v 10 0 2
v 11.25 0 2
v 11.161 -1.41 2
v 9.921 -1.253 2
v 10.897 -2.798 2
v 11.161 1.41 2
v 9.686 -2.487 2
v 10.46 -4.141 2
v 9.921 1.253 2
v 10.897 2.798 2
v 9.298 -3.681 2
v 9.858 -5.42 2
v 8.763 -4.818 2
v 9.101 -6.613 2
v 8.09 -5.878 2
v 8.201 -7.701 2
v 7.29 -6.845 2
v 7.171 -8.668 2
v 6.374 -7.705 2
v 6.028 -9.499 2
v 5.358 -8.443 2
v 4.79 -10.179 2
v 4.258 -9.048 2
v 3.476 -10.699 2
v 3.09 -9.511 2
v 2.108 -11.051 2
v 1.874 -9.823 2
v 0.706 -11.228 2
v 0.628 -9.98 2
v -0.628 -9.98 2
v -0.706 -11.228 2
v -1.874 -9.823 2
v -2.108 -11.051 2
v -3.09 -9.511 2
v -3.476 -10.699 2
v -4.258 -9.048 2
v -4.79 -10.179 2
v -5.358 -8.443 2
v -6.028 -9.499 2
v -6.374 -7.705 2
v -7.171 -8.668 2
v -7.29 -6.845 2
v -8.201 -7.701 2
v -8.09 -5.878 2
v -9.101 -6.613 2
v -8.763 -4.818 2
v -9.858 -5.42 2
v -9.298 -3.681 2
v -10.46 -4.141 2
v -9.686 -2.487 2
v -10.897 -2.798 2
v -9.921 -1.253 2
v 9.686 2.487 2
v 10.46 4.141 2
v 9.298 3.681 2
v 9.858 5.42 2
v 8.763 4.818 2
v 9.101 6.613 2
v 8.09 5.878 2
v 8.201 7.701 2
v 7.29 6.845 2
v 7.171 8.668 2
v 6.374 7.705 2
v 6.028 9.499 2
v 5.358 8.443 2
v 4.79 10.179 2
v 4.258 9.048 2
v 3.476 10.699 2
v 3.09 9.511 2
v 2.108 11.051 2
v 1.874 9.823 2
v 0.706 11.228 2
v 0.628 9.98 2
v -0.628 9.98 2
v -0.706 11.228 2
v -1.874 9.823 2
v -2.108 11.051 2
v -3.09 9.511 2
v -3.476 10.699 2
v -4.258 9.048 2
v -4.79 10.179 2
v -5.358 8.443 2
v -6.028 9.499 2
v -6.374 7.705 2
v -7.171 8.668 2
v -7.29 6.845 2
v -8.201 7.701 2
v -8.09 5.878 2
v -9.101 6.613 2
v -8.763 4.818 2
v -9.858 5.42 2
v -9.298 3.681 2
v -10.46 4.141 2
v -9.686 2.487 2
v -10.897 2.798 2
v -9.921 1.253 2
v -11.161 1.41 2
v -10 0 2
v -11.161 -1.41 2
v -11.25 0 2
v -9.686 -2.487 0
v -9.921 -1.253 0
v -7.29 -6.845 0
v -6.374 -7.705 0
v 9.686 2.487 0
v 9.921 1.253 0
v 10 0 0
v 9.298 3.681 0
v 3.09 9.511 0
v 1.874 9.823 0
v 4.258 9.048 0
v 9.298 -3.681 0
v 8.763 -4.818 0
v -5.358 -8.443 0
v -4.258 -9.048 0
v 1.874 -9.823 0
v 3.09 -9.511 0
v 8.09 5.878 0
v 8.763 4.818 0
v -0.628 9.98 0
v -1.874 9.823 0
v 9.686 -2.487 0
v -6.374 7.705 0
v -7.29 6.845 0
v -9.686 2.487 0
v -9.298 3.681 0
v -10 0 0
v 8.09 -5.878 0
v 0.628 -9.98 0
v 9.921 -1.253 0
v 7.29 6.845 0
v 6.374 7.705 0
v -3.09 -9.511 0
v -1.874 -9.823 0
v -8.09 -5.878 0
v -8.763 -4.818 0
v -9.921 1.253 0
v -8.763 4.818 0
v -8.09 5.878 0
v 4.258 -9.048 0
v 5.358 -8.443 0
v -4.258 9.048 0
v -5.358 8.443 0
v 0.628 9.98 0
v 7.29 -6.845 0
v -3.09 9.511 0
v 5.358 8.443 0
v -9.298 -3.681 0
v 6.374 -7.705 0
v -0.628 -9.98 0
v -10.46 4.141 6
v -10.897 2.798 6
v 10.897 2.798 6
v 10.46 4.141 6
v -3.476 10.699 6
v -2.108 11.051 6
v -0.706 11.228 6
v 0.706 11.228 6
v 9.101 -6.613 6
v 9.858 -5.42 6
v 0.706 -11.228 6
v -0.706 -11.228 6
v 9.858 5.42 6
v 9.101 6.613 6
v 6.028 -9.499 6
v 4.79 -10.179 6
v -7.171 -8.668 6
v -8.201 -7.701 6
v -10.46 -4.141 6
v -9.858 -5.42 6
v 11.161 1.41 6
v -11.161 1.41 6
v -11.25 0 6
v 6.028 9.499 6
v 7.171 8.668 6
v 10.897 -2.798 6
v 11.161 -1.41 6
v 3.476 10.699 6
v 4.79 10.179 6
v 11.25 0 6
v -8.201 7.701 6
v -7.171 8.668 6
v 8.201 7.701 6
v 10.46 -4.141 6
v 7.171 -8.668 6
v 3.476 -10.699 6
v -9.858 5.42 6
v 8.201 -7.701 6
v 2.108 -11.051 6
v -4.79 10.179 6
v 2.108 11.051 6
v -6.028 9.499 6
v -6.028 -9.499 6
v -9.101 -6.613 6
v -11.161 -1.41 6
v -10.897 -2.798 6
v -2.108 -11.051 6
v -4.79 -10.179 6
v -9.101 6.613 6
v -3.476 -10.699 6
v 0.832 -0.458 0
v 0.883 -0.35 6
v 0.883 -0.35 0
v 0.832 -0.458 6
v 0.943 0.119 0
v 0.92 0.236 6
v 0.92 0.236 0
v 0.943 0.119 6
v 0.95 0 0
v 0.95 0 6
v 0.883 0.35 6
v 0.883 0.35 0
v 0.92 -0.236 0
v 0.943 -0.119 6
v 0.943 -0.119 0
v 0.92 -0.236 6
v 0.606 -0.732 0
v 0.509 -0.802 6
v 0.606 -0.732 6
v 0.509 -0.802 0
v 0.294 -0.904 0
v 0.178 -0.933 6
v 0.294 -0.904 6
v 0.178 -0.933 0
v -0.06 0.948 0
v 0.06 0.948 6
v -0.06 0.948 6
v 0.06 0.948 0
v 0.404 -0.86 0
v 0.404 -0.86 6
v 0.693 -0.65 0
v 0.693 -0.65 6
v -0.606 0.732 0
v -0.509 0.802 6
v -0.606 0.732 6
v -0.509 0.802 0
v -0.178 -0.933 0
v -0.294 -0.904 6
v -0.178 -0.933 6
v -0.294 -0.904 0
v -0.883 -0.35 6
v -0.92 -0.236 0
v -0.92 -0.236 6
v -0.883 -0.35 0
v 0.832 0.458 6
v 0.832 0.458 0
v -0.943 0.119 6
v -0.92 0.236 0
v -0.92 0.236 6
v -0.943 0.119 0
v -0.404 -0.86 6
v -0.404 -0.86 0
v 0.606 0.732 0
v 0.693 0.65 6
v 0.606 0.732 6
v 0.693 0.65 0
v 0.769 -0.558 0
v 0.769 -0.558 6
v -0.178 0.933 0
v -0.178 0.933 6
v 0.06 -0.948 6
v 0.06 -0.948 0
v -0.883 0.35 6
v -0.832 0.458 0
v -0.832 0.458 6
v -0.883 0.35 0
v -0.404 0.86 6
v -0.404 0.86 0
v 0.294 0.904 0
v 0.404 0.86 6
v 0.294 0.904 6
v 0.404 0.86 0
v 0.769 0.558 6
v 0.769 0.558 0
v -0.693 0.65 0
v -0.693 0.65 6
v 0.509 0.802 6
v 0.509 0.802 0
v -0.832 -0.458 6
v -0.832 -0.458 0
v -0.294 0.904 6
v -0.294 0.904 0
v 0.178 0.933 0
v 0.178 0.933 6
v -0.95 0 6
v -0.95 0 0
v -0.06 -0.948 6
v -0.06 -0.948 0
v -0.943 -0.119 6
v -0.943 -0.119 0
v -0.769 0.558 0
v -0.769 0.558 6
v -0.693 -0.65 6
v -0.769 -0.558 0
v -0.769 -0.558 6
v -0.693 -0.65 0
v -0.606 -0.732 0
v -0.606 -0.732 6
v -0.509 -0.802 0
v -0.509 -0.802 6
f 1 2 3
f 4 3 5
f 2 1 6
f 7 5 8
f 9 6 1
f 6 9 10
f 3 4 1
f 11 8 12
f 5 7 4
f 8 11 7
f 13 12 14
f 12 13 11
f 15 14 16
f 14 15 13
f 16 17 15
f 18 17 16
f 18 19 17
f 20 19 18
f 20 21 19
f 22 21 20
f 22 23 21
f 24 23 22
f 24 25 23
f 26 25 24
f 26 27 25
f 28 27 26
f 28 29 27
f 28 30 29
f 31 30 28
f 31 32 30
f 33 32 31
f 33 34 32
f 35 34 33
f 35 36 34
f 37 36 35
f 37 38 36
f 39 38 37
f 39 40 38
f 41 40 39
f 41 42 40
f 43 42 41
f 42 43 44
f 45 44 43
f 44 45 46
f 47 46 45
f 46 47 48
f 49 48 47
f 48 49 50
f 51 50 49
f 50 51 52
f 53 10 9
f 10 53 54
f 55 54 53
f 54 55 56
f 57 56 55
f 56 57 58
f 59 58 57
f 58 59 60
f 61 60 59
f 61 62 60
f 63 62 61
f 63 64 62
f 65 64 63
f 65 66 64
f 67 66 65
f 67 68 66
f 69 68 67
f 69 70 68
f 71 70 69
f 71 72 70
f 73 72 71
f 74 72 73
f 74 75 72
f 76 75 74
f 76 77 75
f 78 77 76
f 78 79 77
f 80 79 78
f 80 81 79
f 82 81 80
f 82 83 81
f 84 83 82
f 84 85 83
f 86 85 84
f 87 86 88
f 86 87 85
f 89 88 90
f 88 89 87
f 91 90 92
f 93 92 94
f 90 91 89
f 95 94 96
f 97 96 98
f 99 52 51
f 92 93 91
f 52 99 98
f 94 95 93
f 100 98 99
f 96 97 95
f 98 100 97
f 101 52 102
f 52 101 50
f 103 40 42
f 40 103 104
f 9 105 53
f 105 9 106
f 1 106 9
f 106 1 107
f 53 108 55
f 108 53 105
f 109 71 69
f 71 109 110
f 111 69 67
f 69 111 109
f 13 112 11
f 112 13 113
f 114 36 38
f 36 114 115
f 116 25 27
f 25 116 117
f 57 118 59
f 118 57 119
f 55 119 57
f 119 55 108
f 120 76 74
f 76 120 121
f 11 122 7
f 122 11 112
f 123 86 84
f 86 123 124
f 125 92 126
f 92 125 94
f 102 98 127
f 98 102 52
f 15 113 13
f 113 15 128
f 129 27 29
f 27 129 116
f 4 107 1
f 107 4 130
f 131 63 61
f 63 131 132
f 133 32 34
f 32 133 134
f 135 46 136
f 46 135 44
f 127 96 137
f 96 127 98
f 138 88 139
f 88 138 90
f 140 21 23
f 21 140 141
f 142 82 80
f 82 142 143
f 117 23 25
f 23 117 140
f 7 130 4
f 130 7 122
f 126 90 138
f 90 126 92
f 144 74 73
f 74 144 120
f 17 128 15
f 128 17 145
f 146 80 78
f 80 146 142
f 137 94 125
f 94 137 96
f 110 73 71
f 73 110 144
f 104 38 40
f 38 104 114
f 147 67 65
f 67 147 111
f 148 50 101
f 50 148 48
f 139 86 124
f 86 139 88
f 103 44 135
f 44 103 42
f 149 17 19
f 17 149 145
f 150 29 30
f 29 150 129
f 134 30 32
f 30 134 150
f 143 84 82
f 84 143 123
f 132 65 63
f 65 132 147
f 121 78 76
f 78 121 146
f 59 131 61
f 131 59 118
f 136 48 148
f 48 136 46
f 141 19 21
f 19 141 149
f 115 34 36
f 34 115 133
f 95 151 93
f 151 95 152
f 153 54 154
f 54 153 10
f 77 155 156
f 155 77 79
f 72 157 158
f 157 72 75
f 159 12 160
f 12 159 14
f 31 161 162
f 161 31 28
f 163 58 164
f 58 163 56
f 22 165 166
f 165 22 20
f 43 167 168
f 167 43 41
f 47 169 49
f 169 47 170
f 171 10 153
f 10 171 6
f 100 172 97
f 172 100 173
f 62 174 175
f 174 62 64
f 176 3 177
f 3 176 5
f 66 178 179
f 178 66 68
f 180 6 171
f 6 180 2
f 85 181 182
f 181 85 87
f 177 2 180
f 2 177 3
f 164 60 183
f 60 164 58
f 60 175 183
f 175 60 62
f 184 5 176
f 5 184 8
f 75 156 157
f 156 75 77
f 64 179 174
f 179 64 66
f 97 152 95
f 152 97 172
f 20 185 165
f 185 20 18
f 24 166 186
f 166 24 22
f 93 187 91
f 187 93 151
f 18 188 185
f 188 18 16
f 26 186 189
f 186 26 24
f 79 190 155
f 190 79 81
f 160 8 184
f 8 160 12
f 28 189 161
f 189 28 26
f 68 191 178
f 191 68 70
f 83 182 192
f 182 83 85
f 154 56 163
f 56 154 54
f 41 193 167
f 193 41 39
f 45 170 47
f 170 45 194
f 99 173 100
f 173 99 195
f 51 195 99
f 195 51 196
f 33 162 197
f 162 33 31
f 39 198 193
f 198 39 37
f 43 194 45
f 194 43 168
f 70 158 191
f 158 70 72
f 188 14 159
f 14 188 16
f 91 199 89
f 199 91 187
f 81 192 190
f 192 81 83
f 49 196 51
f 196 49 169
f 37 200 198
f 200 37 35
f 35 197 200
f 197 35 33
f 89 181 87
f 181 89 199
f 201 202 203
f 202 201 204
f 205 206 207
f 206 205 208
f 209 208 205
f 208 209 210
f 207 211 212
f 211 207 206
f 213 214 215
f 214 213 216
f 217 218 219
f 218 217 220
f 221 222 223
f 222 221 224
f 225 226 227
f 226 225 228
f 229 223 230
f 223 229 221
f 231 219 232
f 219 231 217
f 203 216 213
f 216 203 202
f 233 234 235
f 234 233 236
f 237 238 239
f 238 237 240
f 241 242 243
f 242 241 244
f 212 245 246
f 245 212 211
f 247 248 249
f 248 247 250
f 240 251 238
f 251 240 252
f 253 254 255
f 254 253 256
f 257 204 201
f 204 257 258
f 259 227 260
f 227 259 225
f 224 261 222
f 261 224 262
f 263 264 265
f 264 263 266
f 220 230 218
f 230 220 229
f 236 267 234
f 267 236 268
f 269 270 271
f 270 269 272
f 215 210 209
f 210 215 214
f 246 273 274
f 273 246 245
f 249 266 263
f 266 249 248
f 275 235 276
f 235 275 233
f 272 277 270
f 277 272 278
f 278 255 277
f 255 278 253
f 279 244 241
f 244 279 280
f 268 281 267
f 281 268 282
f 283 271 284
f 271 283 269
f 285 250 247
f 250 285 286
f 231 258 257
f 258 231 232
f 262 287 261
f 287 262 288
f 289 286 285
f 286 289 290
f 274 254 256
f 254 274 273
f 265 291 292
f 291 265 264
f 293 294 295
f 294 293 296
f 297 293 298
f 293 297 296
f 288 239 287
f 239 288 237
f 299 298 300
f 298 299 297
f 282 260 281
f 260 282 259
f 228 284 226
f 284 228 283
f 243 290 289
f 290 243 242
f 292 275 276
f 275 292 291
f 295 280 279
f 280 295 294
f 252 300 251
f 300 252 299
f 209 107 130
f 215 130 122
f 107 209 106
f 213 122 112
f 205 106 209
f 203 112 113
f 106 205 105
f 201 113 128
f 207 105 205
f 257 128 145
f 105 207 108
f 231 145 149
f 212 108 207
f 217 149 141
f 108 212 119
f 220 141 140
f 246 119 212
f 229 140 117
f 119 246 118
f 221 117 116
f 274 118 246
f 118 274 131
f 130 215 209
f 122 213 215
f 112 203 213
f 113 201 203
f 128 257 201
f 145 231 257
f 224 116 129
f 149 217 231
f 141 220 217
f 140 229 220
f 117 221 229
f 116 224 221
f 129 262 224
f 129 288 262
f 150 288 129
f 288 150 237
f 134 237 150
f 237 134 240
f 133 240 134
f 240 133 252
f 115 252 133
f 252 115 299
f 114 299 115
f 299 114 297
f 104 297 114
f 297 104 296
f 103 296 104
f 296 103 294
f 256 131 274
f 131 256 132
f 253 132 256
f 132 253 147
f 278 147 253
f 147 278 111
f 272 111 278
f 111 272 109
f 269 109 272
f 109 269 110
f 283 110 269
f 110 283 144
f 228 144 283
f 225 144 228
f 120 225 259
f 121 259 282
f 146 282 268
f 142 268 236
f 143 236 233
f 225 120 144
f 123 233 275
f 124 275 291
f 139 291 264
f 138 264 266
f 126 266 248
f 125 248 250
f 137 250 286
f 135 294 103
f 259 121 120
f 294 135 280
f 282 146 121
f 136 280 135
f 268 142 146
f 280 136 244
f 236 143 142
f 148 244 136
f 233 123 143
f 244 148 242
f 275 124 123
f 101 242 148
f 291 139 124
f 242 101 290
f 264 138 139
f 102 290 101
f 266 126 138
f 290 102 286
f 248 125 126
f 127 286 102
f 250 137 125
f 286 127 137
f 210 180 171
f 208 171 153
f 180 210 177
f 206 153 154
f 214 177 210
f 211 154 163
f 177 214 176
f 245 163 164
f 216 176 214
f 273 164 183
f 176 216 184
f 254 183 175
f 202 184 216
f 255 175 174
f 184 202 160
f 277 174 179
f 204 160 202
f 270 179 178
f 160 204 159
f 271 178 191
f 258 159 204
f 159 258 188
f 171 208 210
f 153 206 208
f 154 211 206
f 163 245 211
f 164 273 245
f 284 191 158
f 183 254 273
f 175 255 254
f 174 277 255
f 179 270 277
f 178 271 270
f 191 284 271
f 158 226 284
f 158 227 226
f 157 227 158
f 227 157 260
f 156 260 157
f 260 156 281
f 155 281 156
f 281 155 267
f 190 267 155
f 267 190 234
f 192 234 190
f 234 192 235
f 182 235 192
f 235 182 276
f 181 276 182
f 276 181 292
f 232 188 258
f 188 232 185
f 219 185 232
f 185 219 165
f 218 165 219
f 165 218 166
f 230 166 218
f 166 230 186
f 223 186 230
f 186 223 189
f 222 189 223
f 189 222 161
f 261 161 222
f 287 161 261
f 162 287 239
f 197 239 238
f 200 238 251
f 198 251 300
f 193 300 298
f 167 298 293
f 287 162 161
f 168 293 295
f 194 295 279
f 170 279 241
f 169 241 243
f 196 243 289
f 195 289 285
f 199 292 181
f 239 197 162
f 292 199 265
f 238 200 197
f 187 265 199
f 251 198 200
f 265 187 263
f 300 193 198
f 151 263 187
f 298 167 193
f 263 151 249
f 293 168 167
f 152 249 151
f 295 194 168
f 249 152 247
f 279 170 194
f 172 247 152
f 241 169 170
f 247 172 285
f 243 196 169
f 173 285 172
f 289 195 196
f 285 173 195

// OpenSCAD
$fn = 50;


difference() {
	union() {
		*color(alpha = 1.0000000000, c = "gray") {
			translate(v = [0, 7, 0]) {
				linear_extrude(height = 12) {
					text(font = "Arial:style=Bold", halign = "center", size = 4.5000000000, text = "COMMENT bearing_plate_plate", valign = "center");
				}
			}
		}
		*color(alpha = 1.0000000000, c = "gray") {
			translate(v = [0, 14, 0]) {
				linear_extrude(height = 12) {
					text(font = "Arial:style=Bold", halign = "center", size = 4.5000000000, text = "COMMENT description oobb_cylinder_shape_p_type_12_depth_3_width_12_height_12_thickness_motor_n20_shaft_p_t_12.0_radius_all_mode", valign = "center");
				}
			}
		}
		translate(v = [0, 0, -6.0000000000]) {
			cylinder(h = 12, r = 12.0000000000);
		}
		*color(alpha = 1.0000000000, c = "gray") {
			translate(v = [0, 7, 0]) {
				linear_extrude(height = 1) {
					text(font = "Arial:style=Bold", halign = "center", size = 4.5000000000, text = "COMMENT bearing_plate_slice", valign = "center");
				}
			}
		}
	}
	union() {
		translate(v = [18.0000000000, 0, -6.0000000000]) {
			rotate(a = [0, 180, 30.0000000000]) {
				difference() {
					union() {
						translate(v = [0, 0, -12.0000000000]) {
							cylinder(h = 12, r = 1.5000000000);
						}
						translate(v = [0, 0, -12.0000000000]) {
							linear_extrude(height = 2.5000000000) {
								polygon(points = [[3.1735000000, 0.0000000000], [1.5867500000, 2.7483316189], [-1.5867500000, 2.7483316189], [-3.1735000000, 0.0000000000], [-1.5867500000, -2.7483316189], [1.5867500000, -2.7483316189]]);
							}
						}
						translate(v = [0, 0, -12.0000000000]) {
							cylinder(h = 12, r = 1.8000000000);
						}
						translate(v = [0, 0, -12.0000000000]) {
							linear_extrude(height = 2.5000000000) {
								polygon(points = [[3.1735000000, 0.0000000000], [1.5867500000, 2.7483316189], [-1.5867500000, 2.7483316189], [-3.1735000000, 0.0000000000], [-1.5867500000, -2.7483316189], [1.5867500000, -2.7483316189]]);
							}
						}
						translate(v = [0, 0, -0.8500000000]) {
							cylinder(r1 = 1.5000000000, r2 = 2.9000000000);
						}
						translate(v = [0, 0, -12.0000000000]) {
							cylinder(h = 12, r = 1.5000000000);
						}
						translate(v = [0, 0, -12.0000000000]) {
							linear_extrude(height = 2.5000000000) {
								polygon(points = [[3.1735000000, 0.0000000000], [1.5867500000, 2.7483316189], [-1.5867500000, 2.7483316189], [-3.1735000000, 0.0000000000], [-1.5867500000, -2.7483316189], [1.5867500000, -2.7483316189]]);
							}
						}
					}
					union();
				}
			}
		}
		translate(v = [-18.0000000000, 0, -6.0000000000]) {
			rotate(a = [0, 180, 30.0000000000]) {
				difference() {
					union() {
						translate(v = [0, 0, -12.0000000000]) {
							cylinder(h = 12, r = 1.5000000000);
						}
						translate(v = [0, 0, -12.0000000000]) {
							linear_extrude(height = 2.5000000000) {
								polygon(points = [[3.1735000000, 0.0000000000], [1.5867500000, 2.7483316189], [-1.5867500000, 2.7483316189], [-3.1735000000, 0.0000000000], [-1.5867500000, -2.7483316189], [1.5867500000, -2.7483316189]]);
							}
						}
						translate(v = [0, 0, -12.0000000000]) {
							cylinder(h = 12, r = 1.8000000000);
						}
						translate(v = [0, 0, -12.0000000000]) {
							linear_extrude(height = 2.5000000000) {
								polygon(points = [[3.1735000000, 0.0000000000], [1.5867500000, 2.7483316189], [-1.5867500000, 2.7483316189], [-3.1735000000, 0.0000000000], [-1.5867500000, -2.7483316189], [1.5867500000, -2.7483316189]]);
							}
						}
						translate(v = [0, 0, -0.8500000000]) {
							cylinder(r1 = 1.5000000000, r2 = 2.9000000000);
						}
						translate(v = [0, 0, -12.0000000000]) {
							cylinder(h = 12, r = 1.5000000000);
						}
						translate(v = [0, 0, -12.0000000000]) {
							linear_extrude(height = 2.5000000000) {
								polygon(points = [[3.1735000000, 0.0000000000], [1.5867500000, 2.7483316189], [-1.5867500000, 2.7483316189], [-3.1735000000, 0.0000000000], [-1.5867500000, -2.7483316189], [1.5867500000, -2.7483316189]]);
							}
						}
					}
					union();
				}
			}
		}
		translate(v = [0, 18.0000000000, 6.0000000000]) {
			rotate(a = [0, 0, 0]) {
				difference() {
					union() {
						translate(v = [0, 0, -12.0000000000]) {
							cylinder(h = 12, r = 1.5000000000);
						}
						translate(v = [0, 0, -12.0000000000]) {
							linear_extrude(height = 2.5000000000) {
								polygon(points = [[3.1735000000, 0.0000000000], [1.5867500000, 2.7483316189], [-1.5867500000, 2.7483316189], [-3.1735000000, 0.0000000000], [-1.5867500000, -2.7483316189], [1.5867500000, -2.7483316189]]);
							}
						}
						translate(v = [0, 0, -12.0000000000]) {
							cylinder(h = 12, r = 1.8000000000);
						}
						translate(v = [0, 0, -12.0000000000]) {
							linear_extrude(height = 2.5000000000) {
								polygon(points = [[3.1735000000, 0.0000000000], [1.5867500000, 2.7483316189], [-1.5867500000, 2.7483316189], [-3.1735000000, 0.0000000000], [-1.5867500000, -2.7483316189], [1.5867500000, -2.7483316189]]);
							}
						}
						translate(v = [0, 0, -0.8500000000]) {
							cylinder(r1 = 1.5000000000, r2 = 2.9000000000);
						}
						translate(v = [0, 0, -12.0000000000]) {
							cylinder(h = 12, r = 1.5000000000);
						}
						translate(v = [0, 0, -12.0000000000]) {
							linear_extrude(height = 2.5000000000) {
								polygon(points = [[3.1735000000, 0.0000000000], [1.5867500000, 2.7483316189], [-1.5867500000, 2.7483316189], [-3.1735000000, 0.0000000000], [-1.5867500000, -2.7483316189], [1.5867500000, -2.7483316189]]);
							}
						}
					}
					union();
				}
			}
		}
		translate(v = [0, -18.0000000000, 6.0000000000]) {
			rotate(a = [0, 0, 0]) {
				difference() {
					union() {
						translate(v = [0, 0, -12.0000000000]) {
							cylinder(h = 12, r = 1.5000000000);
						}
						translate(v = [0, 0, -12.0000000000]) {
							linear_extrude(height = 2.5000000000) {
								polygon(points = [[3.1735000000, 0.0000000000], [1.5867500000, 2.7483316189], [-1.5867500000, 2.7483316189], [-3.1735000000, 0.0000000000], [-1.5867500000, -2.7483316189], [1.5867500000, -2.7483316189]]);
							}
						}
						translate(v = [0, 0, -12.0000000000]) {
							cylinder(h = 12, r = 1.8000000000);
						}
						translate(v = [0, 0, -12.0000000000]) {
							linear_extrude(height = 2.5000000000) {
								polygon(points = [[3.1735000000, 0.0000000000], [1.5867500000, 2.7483316189], [-1.5867500000, 2.7483316189], [-3.1735000000, 0.0000000000], [-1.5867500000, -2.7483316189], [1.5867500000, -2.7483316189]]);
							}
						}
						translate(v = [0, 0, -0.8500000000]) {
							cylinder(r1 = 1.5000000000, r2 = 2.9000000000);
						}
						translate(v = [0, 0, -12.0000000000]) {
							cylinder(h = 12, r = 1.5000000000);
						}
						translate(v = [0, 0, -12.0000000000]) {
							linear_extrude(height = 2.5000000000) {
								polygon(points = [[3.1735000000, 0.0000000000], [1.5867500000, 2.7483316189], [-1.5867500000, 2.7483316189], [-3.1735000000, 0.0000000000], [-1.5867500000, -2.7483316189], [1.5867500000, -2.7483316189]]);
							}
						}
					}
					union();
				}
			}
		}
		*color(alpha = 1.0000000000, c = "gray") {
			translate(v = [0, 14, 0]) {
				linear_extrude(height = 3) {
					text(font = "Arial:style=Bold", halign = "center", size = 4.5000000000, text = "COMMENT description oobb_bearing_shape_n_type_12_depth_3_width_3_height_12_thickness_motor_n20_shaft_6704_bearing", valign = "center");
				}
			}
		}
		translate(v = [0, 0, -2.0000000000]) {
			union() {
				difference() {
					cylinder(h = 4, r = 13.5000000000);
					cylinder(h = 4, r = 10.0000000000);
				}
				difference() {
					translate(v = [0, 0, -50]) {
						cylinder(h = 100, r = 12.2500000000);
					}
					translate(v = [0, 0, -50]) {
						cylinder(h = 100, r = 11.2500000000);
					}
				}
			}
		}
		*color(alpha = 1.0000000000, c = "gray") {
			translate(v = [0, 14, 0]) {
				linear_extrude(height = 3) {
					text(font = "Arial:style=Bold", halign = "center", size = 4.5000000000, text = "COMMENT description oobb_holes_shape_n_type_m6_radius_name_3_width_3_height_12_thickness_motor_n20_shaft_perimeter_miss_middle_holes", valign = "center");
				}
			}
		}
		translate(v = [-15.0000000000, -15.0000000000, -50.0000000000]) {
			cylinder(h = 100, r = 3.0000000000);
		}
		translate(v = [-15.0000000000, 15.0000000000, -50.0000000000]) {
			cylinder(h = 100, r = 3.0000000000);
		}
		translate(v = [15.0000000000, -15.0000000000, -50.0000000000]) {
			cylinder(h = 100, r = 3.0000000000);
		}
		translate(v = [15.0000000000, 15.0000000000, -50.0000000000]) {
			cylinder(h = 100, r = 3.0000000000);
		}
		*color(alpha = 1.0000000000, c = "gray") {
			translate(v = [0, 14, 0]) {
				linear_extrude(height = 3) {
					text(font = "Arial:style=Bold", halign = "center", size = 4.5000000000, text = "COMMENT description oobb_motor_n20_shape_n_type_3_width_3_height_12_thickness_motor_n20_shaft_shaft_part", valign = "center");
				}
			}
		}
		translate(v = [0, 0, 125]) {
			difference() {
				#translate(v = [0, 0, -250]) {
					cylinder(h = 250, r = 0.9500000000);
				}
				#translate(v = [0, -0.8000000000, -250]) {
					cube(size = [1.9000000000, -0.8000000000, 250]);
				}
			}
		}
		*color(alpha = 1.0000000000, c = "gray") {
			translate(v = [18.0000000000, 14, -6.0000000000]) {
				rotate(a = [0, 180, 30.0000000000]) {
					linear_extrude(height = 3) {
						text(font = "Arial:style=Bold", halign = "center", size = 4.5000000000, text = "COMMENT description oobb_screw_countersunk_shape_n_type_m3_radius_name_12_depth_18.0_0_-6.0_pos_3_width_3_height_12_thickness_motor_n20_shaft_0_180_30.0_rot_true_nut_true_overhang", valign = "center");
					}
				}
			}
		}
		*color(alpha = 1.0000000000, c = "gray") {
			translate(v = [-18.0000000000, 14, -6.0000000000]) {
				rotate(a = [0, 180, 30.0000000000]) {
					linear_extrude(height = 3) {
						text(font = "Arial:style=Bold", halign = "center", size = 4.5000000000, text = "COMMENT description oobb_screw_countersunk_shape_n_type_m3_radius_name_12_depth_-18.0_0_-6.0_pos_3_width_3_height_12_thickness_motor_n20_shaft_0_180_30.0_rot_true_nut_true_overhang", valign = "center");
					}
				}
			}
		}
		*color(alpha = 1.0000000000, c = "gray") {
			translate(v = [0, 32.0000000000, 6.0000000000]) {
				linear_extrude(height = 3) {
					text(font = "Arial:style=Bold", halign = "center", size = 4.5000000000, text = "COMMENT description oobb_screw_countersunk_shape_n_type_m3_radius_name_12_depth_0_18.0_6.0_pos_3_width_3_height_12_thickness_motor_n20_shaft_0_0_0_rot_true_nut_true_overhang", valign = "center");
				}
			}
		}
		*color(alpha = 1.0000000000, c = "gray") {
			translate(v = [0, -4.0000000000, 6.0000000000]) {
				linear_extrude(height = 3) {
					text(font = "Arial:style=Bold", halign = "center", size = 4.5000000000, text = "COMMENT description oobb_screw_countersunk_shape_n_type_m3_radius_name_12_depth_0_-18.0_6.0_pos_3_width_3_height_12_thickness_motor_n20_shaft_0_0_0_rot_true_nut_true_overhang", valign = "center");
				}
			}
		}
		*color(alpha = 1.0000000000, c = "gray") {
			translate(v = [0, 14, 0]) {
				linear_extrude(height = 1) {
					text(font = "Arial:style=Bold", halign = "center", size = 4.5000000000, text = "COMMENT description oobb_slice_shape_n_type_3dpr_mode_top_zz", valign = "center");
				}
			}
		}
		translate(v = [-250, -250, -500]) {
			cube(size = [500, 500, 500]);
		}
	}
}
